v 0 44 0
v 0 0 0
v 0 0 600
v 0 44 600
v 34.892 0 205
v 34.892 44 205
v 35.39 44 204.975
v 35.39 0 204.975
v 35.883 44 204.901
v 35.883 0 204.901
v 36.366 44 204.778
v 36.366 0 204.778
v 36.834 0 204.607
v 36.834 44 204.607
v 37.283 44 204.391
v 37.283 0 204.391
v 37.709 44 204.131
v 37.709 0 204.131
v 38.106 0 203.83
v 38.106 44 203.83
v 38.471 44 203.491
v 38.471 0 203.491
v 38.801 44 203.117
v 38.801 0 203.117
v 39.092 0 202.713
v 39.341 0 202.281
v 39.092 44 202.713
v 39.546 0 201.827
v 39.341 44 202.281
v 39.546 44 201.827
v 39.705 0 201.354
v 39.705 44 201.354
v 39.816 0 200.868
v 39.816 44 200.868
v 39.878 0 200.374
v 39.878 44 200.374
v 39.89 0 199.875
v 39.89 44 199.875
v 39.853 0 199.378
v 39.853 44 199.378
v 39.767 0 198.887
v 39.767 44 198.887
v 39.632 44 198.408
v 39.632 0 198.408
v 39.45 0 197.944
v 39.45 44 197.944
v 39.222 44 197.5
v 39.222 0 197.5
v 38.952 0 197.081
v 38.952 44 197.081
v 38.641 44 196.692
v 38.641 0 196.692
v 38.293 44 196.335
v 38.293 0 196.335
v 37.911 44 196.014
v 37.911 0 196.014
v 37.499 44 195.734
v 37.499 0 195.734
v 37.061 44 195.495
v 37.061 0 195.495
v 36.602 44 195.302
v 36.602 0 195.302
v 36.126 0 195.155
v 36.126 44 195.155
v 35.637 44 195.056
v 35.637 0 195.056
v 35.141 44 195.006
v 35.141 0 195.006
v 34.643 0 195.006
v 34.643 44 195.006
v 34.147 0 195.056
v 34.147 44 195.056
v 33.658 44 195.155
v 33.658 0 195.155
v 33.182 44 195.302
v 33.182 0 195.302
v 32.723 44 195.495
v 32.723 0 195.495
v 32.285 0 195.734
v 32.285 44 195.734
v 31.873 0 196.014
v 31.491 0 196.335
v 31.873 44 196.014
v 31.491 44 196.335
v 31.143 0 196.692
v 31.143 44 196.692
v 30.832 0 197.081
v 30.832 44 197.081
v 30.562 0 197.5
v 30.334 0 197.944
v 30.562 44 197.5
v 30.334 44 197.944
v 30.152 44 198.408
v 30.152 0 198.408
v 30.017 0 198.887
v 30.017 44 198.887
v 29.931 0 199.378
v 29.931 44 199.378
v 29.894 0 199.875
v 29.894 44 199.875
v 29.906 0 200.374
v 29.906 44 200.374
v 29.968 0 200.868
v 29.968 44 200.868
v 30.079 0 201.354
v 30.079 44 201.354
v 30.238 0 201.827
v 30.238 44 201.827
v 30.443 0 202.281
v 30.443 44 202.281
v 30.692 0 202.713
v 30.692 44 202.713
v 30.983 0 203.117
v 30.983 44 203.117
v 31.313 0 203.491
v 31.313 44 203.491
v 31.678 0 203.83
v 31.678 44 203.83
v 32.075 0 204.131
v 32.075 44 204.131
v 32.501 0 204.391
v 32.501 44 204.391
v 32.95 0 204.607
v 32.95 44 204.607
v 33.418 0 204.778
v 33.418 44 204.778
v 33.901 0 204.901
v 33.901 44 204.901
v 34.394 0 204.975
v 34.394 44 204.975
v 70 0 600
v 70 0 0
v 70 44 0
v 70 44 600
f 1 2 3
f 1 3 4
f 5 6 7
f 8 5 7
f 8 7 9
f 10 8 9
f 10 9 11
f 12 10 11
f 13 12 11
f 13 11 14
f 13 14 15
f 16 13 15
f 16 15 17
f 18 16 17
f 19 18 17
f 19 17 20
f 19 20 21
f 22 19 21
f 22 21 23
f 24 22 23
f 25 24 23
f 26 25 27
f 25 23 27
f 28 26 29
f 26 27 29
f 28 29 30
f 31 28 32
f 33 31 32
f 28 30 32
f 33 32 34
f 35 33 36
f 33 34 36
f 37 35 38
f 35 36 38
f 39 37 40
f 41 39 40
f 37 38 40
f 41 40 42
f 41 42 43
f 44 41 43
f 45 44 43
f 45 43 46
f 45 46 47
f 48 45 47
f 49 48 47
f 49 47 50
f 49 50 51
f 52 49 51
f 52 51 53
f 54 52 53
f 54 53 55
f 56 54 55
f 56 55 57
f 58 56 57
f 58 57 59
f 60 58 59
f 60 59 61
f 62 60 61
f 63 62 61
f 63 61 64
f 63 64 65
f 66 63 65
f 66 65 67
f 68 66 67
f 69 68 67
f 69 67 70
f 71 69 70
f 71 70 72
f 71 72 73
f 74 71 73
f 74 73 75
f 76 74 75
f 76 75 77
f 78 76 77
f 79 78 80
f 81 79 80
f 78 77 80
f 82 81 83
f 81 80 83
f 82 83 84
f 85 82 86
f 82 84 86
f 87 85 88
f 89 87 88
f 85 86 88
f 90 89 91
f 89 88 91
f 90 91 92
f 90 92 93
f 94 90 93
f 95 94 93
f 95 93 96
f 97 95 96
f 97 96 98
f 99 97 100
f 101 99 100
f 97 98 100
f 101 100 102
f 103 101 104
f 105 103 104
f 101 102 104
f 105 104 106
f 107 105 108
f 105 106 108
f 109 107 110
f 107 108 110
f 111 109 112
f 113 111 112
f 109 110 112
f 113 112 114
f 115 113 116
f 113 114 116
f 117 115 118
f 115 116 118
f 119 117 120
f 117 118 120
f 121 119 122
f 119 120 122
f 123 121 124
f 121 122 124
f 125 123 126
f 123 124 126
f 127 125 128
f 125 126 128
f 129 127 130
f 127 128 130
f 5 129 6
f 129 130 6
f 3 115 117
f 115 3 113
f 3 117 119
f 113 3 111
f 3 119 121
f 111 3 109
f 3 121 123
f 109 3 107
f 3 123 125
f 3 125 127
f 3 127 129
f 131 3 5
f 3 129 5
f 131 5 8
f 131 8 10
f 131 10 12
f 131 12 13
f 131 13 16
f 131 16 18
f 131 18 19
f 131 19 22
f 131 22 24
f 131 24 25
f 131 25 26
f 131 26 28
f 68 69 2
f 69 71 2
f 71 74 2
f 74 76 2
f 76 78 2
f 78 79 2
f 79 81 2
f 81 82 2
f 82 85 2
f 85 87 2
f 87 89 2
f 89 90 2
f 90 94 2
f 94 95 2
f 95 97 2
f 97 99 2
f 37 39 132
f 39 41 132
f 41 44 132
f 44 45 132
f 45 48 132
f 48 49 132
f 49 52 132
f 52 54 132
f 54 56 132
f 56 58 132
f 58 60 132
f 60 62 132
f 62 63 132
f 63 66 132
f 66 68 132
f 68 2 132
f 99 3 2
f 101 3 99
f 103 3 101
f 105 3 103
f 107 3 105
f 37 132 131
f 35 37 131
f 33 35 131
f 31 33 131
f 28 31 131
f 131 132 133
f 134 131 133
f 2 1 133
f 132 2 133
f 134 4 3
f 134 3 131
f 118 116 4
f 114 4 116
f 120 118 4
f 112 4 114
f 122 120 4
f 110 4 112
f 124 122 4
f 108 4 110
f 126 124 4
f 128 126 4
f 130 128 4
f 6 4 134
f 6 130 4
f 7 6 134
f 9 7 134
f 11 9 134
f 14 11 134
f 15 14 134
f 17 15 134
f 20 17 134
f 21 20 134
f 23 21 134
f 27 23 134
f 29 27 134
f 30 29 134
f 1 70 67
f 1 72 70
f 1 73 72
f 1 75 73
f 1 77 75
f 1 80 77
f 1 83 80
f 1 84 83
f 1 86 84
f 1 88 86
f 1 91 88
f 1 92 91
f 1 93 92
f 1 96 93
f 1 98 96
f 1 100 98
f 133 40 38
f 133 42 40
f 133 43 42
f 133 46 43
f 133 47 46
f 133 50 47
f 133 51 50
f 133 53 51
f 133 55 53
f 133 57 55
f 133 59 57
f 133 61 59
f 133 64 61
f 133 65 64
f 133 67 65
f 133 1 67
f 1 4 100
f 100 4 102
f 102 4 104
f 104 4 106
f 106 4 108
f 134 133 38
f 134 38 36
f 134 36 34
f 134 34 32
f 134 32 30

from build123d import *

# Parameters (mm, degrees)
SKETCH2_W          = 70
SKETCH2_H          = 44
EXTRUDE1_DEPTH     = 600
CUT_EXTRUDE1_REACH = 607.67
SKETCH3_R          = 5


with BuildPart() as part:
    # Sketch2 → Extrude1 (new body)
    with BuildSketch(Plane.XY):
        with Locations((35, 22)):
            Rectangle(SKETCH2_W, SKETCH2_H)
    extrude(amount=EXTRUDE1_DEPTH)

    # Sketch3 → Cut-Extrude1 (cut, up to next)
    with BuildSketch(Plane(origin=(0, 44, 0), x_dir=(-1, 0, 0), z_dir=(0, 1, 0)), mode=Mode.PRIVATE) as cut_extrude1_sk1:
        with Locations(Location((-34.89201671, 200, 0), (0, 0, 90))):
            Circle(SKETCH3_R)
    cut_extrude1_tool1 = extrude(cut_extrude1_sk1.sketch, amount=-CUT_EXTRUDE1_REACH, mode=Mode.PRIVATE) & part.part
    add(cut_extrude1_tool1.solids().sort_by_distance((34.892017, 44, 200))[0], mode=Mode.SUBTRACT)


solid = part.part
